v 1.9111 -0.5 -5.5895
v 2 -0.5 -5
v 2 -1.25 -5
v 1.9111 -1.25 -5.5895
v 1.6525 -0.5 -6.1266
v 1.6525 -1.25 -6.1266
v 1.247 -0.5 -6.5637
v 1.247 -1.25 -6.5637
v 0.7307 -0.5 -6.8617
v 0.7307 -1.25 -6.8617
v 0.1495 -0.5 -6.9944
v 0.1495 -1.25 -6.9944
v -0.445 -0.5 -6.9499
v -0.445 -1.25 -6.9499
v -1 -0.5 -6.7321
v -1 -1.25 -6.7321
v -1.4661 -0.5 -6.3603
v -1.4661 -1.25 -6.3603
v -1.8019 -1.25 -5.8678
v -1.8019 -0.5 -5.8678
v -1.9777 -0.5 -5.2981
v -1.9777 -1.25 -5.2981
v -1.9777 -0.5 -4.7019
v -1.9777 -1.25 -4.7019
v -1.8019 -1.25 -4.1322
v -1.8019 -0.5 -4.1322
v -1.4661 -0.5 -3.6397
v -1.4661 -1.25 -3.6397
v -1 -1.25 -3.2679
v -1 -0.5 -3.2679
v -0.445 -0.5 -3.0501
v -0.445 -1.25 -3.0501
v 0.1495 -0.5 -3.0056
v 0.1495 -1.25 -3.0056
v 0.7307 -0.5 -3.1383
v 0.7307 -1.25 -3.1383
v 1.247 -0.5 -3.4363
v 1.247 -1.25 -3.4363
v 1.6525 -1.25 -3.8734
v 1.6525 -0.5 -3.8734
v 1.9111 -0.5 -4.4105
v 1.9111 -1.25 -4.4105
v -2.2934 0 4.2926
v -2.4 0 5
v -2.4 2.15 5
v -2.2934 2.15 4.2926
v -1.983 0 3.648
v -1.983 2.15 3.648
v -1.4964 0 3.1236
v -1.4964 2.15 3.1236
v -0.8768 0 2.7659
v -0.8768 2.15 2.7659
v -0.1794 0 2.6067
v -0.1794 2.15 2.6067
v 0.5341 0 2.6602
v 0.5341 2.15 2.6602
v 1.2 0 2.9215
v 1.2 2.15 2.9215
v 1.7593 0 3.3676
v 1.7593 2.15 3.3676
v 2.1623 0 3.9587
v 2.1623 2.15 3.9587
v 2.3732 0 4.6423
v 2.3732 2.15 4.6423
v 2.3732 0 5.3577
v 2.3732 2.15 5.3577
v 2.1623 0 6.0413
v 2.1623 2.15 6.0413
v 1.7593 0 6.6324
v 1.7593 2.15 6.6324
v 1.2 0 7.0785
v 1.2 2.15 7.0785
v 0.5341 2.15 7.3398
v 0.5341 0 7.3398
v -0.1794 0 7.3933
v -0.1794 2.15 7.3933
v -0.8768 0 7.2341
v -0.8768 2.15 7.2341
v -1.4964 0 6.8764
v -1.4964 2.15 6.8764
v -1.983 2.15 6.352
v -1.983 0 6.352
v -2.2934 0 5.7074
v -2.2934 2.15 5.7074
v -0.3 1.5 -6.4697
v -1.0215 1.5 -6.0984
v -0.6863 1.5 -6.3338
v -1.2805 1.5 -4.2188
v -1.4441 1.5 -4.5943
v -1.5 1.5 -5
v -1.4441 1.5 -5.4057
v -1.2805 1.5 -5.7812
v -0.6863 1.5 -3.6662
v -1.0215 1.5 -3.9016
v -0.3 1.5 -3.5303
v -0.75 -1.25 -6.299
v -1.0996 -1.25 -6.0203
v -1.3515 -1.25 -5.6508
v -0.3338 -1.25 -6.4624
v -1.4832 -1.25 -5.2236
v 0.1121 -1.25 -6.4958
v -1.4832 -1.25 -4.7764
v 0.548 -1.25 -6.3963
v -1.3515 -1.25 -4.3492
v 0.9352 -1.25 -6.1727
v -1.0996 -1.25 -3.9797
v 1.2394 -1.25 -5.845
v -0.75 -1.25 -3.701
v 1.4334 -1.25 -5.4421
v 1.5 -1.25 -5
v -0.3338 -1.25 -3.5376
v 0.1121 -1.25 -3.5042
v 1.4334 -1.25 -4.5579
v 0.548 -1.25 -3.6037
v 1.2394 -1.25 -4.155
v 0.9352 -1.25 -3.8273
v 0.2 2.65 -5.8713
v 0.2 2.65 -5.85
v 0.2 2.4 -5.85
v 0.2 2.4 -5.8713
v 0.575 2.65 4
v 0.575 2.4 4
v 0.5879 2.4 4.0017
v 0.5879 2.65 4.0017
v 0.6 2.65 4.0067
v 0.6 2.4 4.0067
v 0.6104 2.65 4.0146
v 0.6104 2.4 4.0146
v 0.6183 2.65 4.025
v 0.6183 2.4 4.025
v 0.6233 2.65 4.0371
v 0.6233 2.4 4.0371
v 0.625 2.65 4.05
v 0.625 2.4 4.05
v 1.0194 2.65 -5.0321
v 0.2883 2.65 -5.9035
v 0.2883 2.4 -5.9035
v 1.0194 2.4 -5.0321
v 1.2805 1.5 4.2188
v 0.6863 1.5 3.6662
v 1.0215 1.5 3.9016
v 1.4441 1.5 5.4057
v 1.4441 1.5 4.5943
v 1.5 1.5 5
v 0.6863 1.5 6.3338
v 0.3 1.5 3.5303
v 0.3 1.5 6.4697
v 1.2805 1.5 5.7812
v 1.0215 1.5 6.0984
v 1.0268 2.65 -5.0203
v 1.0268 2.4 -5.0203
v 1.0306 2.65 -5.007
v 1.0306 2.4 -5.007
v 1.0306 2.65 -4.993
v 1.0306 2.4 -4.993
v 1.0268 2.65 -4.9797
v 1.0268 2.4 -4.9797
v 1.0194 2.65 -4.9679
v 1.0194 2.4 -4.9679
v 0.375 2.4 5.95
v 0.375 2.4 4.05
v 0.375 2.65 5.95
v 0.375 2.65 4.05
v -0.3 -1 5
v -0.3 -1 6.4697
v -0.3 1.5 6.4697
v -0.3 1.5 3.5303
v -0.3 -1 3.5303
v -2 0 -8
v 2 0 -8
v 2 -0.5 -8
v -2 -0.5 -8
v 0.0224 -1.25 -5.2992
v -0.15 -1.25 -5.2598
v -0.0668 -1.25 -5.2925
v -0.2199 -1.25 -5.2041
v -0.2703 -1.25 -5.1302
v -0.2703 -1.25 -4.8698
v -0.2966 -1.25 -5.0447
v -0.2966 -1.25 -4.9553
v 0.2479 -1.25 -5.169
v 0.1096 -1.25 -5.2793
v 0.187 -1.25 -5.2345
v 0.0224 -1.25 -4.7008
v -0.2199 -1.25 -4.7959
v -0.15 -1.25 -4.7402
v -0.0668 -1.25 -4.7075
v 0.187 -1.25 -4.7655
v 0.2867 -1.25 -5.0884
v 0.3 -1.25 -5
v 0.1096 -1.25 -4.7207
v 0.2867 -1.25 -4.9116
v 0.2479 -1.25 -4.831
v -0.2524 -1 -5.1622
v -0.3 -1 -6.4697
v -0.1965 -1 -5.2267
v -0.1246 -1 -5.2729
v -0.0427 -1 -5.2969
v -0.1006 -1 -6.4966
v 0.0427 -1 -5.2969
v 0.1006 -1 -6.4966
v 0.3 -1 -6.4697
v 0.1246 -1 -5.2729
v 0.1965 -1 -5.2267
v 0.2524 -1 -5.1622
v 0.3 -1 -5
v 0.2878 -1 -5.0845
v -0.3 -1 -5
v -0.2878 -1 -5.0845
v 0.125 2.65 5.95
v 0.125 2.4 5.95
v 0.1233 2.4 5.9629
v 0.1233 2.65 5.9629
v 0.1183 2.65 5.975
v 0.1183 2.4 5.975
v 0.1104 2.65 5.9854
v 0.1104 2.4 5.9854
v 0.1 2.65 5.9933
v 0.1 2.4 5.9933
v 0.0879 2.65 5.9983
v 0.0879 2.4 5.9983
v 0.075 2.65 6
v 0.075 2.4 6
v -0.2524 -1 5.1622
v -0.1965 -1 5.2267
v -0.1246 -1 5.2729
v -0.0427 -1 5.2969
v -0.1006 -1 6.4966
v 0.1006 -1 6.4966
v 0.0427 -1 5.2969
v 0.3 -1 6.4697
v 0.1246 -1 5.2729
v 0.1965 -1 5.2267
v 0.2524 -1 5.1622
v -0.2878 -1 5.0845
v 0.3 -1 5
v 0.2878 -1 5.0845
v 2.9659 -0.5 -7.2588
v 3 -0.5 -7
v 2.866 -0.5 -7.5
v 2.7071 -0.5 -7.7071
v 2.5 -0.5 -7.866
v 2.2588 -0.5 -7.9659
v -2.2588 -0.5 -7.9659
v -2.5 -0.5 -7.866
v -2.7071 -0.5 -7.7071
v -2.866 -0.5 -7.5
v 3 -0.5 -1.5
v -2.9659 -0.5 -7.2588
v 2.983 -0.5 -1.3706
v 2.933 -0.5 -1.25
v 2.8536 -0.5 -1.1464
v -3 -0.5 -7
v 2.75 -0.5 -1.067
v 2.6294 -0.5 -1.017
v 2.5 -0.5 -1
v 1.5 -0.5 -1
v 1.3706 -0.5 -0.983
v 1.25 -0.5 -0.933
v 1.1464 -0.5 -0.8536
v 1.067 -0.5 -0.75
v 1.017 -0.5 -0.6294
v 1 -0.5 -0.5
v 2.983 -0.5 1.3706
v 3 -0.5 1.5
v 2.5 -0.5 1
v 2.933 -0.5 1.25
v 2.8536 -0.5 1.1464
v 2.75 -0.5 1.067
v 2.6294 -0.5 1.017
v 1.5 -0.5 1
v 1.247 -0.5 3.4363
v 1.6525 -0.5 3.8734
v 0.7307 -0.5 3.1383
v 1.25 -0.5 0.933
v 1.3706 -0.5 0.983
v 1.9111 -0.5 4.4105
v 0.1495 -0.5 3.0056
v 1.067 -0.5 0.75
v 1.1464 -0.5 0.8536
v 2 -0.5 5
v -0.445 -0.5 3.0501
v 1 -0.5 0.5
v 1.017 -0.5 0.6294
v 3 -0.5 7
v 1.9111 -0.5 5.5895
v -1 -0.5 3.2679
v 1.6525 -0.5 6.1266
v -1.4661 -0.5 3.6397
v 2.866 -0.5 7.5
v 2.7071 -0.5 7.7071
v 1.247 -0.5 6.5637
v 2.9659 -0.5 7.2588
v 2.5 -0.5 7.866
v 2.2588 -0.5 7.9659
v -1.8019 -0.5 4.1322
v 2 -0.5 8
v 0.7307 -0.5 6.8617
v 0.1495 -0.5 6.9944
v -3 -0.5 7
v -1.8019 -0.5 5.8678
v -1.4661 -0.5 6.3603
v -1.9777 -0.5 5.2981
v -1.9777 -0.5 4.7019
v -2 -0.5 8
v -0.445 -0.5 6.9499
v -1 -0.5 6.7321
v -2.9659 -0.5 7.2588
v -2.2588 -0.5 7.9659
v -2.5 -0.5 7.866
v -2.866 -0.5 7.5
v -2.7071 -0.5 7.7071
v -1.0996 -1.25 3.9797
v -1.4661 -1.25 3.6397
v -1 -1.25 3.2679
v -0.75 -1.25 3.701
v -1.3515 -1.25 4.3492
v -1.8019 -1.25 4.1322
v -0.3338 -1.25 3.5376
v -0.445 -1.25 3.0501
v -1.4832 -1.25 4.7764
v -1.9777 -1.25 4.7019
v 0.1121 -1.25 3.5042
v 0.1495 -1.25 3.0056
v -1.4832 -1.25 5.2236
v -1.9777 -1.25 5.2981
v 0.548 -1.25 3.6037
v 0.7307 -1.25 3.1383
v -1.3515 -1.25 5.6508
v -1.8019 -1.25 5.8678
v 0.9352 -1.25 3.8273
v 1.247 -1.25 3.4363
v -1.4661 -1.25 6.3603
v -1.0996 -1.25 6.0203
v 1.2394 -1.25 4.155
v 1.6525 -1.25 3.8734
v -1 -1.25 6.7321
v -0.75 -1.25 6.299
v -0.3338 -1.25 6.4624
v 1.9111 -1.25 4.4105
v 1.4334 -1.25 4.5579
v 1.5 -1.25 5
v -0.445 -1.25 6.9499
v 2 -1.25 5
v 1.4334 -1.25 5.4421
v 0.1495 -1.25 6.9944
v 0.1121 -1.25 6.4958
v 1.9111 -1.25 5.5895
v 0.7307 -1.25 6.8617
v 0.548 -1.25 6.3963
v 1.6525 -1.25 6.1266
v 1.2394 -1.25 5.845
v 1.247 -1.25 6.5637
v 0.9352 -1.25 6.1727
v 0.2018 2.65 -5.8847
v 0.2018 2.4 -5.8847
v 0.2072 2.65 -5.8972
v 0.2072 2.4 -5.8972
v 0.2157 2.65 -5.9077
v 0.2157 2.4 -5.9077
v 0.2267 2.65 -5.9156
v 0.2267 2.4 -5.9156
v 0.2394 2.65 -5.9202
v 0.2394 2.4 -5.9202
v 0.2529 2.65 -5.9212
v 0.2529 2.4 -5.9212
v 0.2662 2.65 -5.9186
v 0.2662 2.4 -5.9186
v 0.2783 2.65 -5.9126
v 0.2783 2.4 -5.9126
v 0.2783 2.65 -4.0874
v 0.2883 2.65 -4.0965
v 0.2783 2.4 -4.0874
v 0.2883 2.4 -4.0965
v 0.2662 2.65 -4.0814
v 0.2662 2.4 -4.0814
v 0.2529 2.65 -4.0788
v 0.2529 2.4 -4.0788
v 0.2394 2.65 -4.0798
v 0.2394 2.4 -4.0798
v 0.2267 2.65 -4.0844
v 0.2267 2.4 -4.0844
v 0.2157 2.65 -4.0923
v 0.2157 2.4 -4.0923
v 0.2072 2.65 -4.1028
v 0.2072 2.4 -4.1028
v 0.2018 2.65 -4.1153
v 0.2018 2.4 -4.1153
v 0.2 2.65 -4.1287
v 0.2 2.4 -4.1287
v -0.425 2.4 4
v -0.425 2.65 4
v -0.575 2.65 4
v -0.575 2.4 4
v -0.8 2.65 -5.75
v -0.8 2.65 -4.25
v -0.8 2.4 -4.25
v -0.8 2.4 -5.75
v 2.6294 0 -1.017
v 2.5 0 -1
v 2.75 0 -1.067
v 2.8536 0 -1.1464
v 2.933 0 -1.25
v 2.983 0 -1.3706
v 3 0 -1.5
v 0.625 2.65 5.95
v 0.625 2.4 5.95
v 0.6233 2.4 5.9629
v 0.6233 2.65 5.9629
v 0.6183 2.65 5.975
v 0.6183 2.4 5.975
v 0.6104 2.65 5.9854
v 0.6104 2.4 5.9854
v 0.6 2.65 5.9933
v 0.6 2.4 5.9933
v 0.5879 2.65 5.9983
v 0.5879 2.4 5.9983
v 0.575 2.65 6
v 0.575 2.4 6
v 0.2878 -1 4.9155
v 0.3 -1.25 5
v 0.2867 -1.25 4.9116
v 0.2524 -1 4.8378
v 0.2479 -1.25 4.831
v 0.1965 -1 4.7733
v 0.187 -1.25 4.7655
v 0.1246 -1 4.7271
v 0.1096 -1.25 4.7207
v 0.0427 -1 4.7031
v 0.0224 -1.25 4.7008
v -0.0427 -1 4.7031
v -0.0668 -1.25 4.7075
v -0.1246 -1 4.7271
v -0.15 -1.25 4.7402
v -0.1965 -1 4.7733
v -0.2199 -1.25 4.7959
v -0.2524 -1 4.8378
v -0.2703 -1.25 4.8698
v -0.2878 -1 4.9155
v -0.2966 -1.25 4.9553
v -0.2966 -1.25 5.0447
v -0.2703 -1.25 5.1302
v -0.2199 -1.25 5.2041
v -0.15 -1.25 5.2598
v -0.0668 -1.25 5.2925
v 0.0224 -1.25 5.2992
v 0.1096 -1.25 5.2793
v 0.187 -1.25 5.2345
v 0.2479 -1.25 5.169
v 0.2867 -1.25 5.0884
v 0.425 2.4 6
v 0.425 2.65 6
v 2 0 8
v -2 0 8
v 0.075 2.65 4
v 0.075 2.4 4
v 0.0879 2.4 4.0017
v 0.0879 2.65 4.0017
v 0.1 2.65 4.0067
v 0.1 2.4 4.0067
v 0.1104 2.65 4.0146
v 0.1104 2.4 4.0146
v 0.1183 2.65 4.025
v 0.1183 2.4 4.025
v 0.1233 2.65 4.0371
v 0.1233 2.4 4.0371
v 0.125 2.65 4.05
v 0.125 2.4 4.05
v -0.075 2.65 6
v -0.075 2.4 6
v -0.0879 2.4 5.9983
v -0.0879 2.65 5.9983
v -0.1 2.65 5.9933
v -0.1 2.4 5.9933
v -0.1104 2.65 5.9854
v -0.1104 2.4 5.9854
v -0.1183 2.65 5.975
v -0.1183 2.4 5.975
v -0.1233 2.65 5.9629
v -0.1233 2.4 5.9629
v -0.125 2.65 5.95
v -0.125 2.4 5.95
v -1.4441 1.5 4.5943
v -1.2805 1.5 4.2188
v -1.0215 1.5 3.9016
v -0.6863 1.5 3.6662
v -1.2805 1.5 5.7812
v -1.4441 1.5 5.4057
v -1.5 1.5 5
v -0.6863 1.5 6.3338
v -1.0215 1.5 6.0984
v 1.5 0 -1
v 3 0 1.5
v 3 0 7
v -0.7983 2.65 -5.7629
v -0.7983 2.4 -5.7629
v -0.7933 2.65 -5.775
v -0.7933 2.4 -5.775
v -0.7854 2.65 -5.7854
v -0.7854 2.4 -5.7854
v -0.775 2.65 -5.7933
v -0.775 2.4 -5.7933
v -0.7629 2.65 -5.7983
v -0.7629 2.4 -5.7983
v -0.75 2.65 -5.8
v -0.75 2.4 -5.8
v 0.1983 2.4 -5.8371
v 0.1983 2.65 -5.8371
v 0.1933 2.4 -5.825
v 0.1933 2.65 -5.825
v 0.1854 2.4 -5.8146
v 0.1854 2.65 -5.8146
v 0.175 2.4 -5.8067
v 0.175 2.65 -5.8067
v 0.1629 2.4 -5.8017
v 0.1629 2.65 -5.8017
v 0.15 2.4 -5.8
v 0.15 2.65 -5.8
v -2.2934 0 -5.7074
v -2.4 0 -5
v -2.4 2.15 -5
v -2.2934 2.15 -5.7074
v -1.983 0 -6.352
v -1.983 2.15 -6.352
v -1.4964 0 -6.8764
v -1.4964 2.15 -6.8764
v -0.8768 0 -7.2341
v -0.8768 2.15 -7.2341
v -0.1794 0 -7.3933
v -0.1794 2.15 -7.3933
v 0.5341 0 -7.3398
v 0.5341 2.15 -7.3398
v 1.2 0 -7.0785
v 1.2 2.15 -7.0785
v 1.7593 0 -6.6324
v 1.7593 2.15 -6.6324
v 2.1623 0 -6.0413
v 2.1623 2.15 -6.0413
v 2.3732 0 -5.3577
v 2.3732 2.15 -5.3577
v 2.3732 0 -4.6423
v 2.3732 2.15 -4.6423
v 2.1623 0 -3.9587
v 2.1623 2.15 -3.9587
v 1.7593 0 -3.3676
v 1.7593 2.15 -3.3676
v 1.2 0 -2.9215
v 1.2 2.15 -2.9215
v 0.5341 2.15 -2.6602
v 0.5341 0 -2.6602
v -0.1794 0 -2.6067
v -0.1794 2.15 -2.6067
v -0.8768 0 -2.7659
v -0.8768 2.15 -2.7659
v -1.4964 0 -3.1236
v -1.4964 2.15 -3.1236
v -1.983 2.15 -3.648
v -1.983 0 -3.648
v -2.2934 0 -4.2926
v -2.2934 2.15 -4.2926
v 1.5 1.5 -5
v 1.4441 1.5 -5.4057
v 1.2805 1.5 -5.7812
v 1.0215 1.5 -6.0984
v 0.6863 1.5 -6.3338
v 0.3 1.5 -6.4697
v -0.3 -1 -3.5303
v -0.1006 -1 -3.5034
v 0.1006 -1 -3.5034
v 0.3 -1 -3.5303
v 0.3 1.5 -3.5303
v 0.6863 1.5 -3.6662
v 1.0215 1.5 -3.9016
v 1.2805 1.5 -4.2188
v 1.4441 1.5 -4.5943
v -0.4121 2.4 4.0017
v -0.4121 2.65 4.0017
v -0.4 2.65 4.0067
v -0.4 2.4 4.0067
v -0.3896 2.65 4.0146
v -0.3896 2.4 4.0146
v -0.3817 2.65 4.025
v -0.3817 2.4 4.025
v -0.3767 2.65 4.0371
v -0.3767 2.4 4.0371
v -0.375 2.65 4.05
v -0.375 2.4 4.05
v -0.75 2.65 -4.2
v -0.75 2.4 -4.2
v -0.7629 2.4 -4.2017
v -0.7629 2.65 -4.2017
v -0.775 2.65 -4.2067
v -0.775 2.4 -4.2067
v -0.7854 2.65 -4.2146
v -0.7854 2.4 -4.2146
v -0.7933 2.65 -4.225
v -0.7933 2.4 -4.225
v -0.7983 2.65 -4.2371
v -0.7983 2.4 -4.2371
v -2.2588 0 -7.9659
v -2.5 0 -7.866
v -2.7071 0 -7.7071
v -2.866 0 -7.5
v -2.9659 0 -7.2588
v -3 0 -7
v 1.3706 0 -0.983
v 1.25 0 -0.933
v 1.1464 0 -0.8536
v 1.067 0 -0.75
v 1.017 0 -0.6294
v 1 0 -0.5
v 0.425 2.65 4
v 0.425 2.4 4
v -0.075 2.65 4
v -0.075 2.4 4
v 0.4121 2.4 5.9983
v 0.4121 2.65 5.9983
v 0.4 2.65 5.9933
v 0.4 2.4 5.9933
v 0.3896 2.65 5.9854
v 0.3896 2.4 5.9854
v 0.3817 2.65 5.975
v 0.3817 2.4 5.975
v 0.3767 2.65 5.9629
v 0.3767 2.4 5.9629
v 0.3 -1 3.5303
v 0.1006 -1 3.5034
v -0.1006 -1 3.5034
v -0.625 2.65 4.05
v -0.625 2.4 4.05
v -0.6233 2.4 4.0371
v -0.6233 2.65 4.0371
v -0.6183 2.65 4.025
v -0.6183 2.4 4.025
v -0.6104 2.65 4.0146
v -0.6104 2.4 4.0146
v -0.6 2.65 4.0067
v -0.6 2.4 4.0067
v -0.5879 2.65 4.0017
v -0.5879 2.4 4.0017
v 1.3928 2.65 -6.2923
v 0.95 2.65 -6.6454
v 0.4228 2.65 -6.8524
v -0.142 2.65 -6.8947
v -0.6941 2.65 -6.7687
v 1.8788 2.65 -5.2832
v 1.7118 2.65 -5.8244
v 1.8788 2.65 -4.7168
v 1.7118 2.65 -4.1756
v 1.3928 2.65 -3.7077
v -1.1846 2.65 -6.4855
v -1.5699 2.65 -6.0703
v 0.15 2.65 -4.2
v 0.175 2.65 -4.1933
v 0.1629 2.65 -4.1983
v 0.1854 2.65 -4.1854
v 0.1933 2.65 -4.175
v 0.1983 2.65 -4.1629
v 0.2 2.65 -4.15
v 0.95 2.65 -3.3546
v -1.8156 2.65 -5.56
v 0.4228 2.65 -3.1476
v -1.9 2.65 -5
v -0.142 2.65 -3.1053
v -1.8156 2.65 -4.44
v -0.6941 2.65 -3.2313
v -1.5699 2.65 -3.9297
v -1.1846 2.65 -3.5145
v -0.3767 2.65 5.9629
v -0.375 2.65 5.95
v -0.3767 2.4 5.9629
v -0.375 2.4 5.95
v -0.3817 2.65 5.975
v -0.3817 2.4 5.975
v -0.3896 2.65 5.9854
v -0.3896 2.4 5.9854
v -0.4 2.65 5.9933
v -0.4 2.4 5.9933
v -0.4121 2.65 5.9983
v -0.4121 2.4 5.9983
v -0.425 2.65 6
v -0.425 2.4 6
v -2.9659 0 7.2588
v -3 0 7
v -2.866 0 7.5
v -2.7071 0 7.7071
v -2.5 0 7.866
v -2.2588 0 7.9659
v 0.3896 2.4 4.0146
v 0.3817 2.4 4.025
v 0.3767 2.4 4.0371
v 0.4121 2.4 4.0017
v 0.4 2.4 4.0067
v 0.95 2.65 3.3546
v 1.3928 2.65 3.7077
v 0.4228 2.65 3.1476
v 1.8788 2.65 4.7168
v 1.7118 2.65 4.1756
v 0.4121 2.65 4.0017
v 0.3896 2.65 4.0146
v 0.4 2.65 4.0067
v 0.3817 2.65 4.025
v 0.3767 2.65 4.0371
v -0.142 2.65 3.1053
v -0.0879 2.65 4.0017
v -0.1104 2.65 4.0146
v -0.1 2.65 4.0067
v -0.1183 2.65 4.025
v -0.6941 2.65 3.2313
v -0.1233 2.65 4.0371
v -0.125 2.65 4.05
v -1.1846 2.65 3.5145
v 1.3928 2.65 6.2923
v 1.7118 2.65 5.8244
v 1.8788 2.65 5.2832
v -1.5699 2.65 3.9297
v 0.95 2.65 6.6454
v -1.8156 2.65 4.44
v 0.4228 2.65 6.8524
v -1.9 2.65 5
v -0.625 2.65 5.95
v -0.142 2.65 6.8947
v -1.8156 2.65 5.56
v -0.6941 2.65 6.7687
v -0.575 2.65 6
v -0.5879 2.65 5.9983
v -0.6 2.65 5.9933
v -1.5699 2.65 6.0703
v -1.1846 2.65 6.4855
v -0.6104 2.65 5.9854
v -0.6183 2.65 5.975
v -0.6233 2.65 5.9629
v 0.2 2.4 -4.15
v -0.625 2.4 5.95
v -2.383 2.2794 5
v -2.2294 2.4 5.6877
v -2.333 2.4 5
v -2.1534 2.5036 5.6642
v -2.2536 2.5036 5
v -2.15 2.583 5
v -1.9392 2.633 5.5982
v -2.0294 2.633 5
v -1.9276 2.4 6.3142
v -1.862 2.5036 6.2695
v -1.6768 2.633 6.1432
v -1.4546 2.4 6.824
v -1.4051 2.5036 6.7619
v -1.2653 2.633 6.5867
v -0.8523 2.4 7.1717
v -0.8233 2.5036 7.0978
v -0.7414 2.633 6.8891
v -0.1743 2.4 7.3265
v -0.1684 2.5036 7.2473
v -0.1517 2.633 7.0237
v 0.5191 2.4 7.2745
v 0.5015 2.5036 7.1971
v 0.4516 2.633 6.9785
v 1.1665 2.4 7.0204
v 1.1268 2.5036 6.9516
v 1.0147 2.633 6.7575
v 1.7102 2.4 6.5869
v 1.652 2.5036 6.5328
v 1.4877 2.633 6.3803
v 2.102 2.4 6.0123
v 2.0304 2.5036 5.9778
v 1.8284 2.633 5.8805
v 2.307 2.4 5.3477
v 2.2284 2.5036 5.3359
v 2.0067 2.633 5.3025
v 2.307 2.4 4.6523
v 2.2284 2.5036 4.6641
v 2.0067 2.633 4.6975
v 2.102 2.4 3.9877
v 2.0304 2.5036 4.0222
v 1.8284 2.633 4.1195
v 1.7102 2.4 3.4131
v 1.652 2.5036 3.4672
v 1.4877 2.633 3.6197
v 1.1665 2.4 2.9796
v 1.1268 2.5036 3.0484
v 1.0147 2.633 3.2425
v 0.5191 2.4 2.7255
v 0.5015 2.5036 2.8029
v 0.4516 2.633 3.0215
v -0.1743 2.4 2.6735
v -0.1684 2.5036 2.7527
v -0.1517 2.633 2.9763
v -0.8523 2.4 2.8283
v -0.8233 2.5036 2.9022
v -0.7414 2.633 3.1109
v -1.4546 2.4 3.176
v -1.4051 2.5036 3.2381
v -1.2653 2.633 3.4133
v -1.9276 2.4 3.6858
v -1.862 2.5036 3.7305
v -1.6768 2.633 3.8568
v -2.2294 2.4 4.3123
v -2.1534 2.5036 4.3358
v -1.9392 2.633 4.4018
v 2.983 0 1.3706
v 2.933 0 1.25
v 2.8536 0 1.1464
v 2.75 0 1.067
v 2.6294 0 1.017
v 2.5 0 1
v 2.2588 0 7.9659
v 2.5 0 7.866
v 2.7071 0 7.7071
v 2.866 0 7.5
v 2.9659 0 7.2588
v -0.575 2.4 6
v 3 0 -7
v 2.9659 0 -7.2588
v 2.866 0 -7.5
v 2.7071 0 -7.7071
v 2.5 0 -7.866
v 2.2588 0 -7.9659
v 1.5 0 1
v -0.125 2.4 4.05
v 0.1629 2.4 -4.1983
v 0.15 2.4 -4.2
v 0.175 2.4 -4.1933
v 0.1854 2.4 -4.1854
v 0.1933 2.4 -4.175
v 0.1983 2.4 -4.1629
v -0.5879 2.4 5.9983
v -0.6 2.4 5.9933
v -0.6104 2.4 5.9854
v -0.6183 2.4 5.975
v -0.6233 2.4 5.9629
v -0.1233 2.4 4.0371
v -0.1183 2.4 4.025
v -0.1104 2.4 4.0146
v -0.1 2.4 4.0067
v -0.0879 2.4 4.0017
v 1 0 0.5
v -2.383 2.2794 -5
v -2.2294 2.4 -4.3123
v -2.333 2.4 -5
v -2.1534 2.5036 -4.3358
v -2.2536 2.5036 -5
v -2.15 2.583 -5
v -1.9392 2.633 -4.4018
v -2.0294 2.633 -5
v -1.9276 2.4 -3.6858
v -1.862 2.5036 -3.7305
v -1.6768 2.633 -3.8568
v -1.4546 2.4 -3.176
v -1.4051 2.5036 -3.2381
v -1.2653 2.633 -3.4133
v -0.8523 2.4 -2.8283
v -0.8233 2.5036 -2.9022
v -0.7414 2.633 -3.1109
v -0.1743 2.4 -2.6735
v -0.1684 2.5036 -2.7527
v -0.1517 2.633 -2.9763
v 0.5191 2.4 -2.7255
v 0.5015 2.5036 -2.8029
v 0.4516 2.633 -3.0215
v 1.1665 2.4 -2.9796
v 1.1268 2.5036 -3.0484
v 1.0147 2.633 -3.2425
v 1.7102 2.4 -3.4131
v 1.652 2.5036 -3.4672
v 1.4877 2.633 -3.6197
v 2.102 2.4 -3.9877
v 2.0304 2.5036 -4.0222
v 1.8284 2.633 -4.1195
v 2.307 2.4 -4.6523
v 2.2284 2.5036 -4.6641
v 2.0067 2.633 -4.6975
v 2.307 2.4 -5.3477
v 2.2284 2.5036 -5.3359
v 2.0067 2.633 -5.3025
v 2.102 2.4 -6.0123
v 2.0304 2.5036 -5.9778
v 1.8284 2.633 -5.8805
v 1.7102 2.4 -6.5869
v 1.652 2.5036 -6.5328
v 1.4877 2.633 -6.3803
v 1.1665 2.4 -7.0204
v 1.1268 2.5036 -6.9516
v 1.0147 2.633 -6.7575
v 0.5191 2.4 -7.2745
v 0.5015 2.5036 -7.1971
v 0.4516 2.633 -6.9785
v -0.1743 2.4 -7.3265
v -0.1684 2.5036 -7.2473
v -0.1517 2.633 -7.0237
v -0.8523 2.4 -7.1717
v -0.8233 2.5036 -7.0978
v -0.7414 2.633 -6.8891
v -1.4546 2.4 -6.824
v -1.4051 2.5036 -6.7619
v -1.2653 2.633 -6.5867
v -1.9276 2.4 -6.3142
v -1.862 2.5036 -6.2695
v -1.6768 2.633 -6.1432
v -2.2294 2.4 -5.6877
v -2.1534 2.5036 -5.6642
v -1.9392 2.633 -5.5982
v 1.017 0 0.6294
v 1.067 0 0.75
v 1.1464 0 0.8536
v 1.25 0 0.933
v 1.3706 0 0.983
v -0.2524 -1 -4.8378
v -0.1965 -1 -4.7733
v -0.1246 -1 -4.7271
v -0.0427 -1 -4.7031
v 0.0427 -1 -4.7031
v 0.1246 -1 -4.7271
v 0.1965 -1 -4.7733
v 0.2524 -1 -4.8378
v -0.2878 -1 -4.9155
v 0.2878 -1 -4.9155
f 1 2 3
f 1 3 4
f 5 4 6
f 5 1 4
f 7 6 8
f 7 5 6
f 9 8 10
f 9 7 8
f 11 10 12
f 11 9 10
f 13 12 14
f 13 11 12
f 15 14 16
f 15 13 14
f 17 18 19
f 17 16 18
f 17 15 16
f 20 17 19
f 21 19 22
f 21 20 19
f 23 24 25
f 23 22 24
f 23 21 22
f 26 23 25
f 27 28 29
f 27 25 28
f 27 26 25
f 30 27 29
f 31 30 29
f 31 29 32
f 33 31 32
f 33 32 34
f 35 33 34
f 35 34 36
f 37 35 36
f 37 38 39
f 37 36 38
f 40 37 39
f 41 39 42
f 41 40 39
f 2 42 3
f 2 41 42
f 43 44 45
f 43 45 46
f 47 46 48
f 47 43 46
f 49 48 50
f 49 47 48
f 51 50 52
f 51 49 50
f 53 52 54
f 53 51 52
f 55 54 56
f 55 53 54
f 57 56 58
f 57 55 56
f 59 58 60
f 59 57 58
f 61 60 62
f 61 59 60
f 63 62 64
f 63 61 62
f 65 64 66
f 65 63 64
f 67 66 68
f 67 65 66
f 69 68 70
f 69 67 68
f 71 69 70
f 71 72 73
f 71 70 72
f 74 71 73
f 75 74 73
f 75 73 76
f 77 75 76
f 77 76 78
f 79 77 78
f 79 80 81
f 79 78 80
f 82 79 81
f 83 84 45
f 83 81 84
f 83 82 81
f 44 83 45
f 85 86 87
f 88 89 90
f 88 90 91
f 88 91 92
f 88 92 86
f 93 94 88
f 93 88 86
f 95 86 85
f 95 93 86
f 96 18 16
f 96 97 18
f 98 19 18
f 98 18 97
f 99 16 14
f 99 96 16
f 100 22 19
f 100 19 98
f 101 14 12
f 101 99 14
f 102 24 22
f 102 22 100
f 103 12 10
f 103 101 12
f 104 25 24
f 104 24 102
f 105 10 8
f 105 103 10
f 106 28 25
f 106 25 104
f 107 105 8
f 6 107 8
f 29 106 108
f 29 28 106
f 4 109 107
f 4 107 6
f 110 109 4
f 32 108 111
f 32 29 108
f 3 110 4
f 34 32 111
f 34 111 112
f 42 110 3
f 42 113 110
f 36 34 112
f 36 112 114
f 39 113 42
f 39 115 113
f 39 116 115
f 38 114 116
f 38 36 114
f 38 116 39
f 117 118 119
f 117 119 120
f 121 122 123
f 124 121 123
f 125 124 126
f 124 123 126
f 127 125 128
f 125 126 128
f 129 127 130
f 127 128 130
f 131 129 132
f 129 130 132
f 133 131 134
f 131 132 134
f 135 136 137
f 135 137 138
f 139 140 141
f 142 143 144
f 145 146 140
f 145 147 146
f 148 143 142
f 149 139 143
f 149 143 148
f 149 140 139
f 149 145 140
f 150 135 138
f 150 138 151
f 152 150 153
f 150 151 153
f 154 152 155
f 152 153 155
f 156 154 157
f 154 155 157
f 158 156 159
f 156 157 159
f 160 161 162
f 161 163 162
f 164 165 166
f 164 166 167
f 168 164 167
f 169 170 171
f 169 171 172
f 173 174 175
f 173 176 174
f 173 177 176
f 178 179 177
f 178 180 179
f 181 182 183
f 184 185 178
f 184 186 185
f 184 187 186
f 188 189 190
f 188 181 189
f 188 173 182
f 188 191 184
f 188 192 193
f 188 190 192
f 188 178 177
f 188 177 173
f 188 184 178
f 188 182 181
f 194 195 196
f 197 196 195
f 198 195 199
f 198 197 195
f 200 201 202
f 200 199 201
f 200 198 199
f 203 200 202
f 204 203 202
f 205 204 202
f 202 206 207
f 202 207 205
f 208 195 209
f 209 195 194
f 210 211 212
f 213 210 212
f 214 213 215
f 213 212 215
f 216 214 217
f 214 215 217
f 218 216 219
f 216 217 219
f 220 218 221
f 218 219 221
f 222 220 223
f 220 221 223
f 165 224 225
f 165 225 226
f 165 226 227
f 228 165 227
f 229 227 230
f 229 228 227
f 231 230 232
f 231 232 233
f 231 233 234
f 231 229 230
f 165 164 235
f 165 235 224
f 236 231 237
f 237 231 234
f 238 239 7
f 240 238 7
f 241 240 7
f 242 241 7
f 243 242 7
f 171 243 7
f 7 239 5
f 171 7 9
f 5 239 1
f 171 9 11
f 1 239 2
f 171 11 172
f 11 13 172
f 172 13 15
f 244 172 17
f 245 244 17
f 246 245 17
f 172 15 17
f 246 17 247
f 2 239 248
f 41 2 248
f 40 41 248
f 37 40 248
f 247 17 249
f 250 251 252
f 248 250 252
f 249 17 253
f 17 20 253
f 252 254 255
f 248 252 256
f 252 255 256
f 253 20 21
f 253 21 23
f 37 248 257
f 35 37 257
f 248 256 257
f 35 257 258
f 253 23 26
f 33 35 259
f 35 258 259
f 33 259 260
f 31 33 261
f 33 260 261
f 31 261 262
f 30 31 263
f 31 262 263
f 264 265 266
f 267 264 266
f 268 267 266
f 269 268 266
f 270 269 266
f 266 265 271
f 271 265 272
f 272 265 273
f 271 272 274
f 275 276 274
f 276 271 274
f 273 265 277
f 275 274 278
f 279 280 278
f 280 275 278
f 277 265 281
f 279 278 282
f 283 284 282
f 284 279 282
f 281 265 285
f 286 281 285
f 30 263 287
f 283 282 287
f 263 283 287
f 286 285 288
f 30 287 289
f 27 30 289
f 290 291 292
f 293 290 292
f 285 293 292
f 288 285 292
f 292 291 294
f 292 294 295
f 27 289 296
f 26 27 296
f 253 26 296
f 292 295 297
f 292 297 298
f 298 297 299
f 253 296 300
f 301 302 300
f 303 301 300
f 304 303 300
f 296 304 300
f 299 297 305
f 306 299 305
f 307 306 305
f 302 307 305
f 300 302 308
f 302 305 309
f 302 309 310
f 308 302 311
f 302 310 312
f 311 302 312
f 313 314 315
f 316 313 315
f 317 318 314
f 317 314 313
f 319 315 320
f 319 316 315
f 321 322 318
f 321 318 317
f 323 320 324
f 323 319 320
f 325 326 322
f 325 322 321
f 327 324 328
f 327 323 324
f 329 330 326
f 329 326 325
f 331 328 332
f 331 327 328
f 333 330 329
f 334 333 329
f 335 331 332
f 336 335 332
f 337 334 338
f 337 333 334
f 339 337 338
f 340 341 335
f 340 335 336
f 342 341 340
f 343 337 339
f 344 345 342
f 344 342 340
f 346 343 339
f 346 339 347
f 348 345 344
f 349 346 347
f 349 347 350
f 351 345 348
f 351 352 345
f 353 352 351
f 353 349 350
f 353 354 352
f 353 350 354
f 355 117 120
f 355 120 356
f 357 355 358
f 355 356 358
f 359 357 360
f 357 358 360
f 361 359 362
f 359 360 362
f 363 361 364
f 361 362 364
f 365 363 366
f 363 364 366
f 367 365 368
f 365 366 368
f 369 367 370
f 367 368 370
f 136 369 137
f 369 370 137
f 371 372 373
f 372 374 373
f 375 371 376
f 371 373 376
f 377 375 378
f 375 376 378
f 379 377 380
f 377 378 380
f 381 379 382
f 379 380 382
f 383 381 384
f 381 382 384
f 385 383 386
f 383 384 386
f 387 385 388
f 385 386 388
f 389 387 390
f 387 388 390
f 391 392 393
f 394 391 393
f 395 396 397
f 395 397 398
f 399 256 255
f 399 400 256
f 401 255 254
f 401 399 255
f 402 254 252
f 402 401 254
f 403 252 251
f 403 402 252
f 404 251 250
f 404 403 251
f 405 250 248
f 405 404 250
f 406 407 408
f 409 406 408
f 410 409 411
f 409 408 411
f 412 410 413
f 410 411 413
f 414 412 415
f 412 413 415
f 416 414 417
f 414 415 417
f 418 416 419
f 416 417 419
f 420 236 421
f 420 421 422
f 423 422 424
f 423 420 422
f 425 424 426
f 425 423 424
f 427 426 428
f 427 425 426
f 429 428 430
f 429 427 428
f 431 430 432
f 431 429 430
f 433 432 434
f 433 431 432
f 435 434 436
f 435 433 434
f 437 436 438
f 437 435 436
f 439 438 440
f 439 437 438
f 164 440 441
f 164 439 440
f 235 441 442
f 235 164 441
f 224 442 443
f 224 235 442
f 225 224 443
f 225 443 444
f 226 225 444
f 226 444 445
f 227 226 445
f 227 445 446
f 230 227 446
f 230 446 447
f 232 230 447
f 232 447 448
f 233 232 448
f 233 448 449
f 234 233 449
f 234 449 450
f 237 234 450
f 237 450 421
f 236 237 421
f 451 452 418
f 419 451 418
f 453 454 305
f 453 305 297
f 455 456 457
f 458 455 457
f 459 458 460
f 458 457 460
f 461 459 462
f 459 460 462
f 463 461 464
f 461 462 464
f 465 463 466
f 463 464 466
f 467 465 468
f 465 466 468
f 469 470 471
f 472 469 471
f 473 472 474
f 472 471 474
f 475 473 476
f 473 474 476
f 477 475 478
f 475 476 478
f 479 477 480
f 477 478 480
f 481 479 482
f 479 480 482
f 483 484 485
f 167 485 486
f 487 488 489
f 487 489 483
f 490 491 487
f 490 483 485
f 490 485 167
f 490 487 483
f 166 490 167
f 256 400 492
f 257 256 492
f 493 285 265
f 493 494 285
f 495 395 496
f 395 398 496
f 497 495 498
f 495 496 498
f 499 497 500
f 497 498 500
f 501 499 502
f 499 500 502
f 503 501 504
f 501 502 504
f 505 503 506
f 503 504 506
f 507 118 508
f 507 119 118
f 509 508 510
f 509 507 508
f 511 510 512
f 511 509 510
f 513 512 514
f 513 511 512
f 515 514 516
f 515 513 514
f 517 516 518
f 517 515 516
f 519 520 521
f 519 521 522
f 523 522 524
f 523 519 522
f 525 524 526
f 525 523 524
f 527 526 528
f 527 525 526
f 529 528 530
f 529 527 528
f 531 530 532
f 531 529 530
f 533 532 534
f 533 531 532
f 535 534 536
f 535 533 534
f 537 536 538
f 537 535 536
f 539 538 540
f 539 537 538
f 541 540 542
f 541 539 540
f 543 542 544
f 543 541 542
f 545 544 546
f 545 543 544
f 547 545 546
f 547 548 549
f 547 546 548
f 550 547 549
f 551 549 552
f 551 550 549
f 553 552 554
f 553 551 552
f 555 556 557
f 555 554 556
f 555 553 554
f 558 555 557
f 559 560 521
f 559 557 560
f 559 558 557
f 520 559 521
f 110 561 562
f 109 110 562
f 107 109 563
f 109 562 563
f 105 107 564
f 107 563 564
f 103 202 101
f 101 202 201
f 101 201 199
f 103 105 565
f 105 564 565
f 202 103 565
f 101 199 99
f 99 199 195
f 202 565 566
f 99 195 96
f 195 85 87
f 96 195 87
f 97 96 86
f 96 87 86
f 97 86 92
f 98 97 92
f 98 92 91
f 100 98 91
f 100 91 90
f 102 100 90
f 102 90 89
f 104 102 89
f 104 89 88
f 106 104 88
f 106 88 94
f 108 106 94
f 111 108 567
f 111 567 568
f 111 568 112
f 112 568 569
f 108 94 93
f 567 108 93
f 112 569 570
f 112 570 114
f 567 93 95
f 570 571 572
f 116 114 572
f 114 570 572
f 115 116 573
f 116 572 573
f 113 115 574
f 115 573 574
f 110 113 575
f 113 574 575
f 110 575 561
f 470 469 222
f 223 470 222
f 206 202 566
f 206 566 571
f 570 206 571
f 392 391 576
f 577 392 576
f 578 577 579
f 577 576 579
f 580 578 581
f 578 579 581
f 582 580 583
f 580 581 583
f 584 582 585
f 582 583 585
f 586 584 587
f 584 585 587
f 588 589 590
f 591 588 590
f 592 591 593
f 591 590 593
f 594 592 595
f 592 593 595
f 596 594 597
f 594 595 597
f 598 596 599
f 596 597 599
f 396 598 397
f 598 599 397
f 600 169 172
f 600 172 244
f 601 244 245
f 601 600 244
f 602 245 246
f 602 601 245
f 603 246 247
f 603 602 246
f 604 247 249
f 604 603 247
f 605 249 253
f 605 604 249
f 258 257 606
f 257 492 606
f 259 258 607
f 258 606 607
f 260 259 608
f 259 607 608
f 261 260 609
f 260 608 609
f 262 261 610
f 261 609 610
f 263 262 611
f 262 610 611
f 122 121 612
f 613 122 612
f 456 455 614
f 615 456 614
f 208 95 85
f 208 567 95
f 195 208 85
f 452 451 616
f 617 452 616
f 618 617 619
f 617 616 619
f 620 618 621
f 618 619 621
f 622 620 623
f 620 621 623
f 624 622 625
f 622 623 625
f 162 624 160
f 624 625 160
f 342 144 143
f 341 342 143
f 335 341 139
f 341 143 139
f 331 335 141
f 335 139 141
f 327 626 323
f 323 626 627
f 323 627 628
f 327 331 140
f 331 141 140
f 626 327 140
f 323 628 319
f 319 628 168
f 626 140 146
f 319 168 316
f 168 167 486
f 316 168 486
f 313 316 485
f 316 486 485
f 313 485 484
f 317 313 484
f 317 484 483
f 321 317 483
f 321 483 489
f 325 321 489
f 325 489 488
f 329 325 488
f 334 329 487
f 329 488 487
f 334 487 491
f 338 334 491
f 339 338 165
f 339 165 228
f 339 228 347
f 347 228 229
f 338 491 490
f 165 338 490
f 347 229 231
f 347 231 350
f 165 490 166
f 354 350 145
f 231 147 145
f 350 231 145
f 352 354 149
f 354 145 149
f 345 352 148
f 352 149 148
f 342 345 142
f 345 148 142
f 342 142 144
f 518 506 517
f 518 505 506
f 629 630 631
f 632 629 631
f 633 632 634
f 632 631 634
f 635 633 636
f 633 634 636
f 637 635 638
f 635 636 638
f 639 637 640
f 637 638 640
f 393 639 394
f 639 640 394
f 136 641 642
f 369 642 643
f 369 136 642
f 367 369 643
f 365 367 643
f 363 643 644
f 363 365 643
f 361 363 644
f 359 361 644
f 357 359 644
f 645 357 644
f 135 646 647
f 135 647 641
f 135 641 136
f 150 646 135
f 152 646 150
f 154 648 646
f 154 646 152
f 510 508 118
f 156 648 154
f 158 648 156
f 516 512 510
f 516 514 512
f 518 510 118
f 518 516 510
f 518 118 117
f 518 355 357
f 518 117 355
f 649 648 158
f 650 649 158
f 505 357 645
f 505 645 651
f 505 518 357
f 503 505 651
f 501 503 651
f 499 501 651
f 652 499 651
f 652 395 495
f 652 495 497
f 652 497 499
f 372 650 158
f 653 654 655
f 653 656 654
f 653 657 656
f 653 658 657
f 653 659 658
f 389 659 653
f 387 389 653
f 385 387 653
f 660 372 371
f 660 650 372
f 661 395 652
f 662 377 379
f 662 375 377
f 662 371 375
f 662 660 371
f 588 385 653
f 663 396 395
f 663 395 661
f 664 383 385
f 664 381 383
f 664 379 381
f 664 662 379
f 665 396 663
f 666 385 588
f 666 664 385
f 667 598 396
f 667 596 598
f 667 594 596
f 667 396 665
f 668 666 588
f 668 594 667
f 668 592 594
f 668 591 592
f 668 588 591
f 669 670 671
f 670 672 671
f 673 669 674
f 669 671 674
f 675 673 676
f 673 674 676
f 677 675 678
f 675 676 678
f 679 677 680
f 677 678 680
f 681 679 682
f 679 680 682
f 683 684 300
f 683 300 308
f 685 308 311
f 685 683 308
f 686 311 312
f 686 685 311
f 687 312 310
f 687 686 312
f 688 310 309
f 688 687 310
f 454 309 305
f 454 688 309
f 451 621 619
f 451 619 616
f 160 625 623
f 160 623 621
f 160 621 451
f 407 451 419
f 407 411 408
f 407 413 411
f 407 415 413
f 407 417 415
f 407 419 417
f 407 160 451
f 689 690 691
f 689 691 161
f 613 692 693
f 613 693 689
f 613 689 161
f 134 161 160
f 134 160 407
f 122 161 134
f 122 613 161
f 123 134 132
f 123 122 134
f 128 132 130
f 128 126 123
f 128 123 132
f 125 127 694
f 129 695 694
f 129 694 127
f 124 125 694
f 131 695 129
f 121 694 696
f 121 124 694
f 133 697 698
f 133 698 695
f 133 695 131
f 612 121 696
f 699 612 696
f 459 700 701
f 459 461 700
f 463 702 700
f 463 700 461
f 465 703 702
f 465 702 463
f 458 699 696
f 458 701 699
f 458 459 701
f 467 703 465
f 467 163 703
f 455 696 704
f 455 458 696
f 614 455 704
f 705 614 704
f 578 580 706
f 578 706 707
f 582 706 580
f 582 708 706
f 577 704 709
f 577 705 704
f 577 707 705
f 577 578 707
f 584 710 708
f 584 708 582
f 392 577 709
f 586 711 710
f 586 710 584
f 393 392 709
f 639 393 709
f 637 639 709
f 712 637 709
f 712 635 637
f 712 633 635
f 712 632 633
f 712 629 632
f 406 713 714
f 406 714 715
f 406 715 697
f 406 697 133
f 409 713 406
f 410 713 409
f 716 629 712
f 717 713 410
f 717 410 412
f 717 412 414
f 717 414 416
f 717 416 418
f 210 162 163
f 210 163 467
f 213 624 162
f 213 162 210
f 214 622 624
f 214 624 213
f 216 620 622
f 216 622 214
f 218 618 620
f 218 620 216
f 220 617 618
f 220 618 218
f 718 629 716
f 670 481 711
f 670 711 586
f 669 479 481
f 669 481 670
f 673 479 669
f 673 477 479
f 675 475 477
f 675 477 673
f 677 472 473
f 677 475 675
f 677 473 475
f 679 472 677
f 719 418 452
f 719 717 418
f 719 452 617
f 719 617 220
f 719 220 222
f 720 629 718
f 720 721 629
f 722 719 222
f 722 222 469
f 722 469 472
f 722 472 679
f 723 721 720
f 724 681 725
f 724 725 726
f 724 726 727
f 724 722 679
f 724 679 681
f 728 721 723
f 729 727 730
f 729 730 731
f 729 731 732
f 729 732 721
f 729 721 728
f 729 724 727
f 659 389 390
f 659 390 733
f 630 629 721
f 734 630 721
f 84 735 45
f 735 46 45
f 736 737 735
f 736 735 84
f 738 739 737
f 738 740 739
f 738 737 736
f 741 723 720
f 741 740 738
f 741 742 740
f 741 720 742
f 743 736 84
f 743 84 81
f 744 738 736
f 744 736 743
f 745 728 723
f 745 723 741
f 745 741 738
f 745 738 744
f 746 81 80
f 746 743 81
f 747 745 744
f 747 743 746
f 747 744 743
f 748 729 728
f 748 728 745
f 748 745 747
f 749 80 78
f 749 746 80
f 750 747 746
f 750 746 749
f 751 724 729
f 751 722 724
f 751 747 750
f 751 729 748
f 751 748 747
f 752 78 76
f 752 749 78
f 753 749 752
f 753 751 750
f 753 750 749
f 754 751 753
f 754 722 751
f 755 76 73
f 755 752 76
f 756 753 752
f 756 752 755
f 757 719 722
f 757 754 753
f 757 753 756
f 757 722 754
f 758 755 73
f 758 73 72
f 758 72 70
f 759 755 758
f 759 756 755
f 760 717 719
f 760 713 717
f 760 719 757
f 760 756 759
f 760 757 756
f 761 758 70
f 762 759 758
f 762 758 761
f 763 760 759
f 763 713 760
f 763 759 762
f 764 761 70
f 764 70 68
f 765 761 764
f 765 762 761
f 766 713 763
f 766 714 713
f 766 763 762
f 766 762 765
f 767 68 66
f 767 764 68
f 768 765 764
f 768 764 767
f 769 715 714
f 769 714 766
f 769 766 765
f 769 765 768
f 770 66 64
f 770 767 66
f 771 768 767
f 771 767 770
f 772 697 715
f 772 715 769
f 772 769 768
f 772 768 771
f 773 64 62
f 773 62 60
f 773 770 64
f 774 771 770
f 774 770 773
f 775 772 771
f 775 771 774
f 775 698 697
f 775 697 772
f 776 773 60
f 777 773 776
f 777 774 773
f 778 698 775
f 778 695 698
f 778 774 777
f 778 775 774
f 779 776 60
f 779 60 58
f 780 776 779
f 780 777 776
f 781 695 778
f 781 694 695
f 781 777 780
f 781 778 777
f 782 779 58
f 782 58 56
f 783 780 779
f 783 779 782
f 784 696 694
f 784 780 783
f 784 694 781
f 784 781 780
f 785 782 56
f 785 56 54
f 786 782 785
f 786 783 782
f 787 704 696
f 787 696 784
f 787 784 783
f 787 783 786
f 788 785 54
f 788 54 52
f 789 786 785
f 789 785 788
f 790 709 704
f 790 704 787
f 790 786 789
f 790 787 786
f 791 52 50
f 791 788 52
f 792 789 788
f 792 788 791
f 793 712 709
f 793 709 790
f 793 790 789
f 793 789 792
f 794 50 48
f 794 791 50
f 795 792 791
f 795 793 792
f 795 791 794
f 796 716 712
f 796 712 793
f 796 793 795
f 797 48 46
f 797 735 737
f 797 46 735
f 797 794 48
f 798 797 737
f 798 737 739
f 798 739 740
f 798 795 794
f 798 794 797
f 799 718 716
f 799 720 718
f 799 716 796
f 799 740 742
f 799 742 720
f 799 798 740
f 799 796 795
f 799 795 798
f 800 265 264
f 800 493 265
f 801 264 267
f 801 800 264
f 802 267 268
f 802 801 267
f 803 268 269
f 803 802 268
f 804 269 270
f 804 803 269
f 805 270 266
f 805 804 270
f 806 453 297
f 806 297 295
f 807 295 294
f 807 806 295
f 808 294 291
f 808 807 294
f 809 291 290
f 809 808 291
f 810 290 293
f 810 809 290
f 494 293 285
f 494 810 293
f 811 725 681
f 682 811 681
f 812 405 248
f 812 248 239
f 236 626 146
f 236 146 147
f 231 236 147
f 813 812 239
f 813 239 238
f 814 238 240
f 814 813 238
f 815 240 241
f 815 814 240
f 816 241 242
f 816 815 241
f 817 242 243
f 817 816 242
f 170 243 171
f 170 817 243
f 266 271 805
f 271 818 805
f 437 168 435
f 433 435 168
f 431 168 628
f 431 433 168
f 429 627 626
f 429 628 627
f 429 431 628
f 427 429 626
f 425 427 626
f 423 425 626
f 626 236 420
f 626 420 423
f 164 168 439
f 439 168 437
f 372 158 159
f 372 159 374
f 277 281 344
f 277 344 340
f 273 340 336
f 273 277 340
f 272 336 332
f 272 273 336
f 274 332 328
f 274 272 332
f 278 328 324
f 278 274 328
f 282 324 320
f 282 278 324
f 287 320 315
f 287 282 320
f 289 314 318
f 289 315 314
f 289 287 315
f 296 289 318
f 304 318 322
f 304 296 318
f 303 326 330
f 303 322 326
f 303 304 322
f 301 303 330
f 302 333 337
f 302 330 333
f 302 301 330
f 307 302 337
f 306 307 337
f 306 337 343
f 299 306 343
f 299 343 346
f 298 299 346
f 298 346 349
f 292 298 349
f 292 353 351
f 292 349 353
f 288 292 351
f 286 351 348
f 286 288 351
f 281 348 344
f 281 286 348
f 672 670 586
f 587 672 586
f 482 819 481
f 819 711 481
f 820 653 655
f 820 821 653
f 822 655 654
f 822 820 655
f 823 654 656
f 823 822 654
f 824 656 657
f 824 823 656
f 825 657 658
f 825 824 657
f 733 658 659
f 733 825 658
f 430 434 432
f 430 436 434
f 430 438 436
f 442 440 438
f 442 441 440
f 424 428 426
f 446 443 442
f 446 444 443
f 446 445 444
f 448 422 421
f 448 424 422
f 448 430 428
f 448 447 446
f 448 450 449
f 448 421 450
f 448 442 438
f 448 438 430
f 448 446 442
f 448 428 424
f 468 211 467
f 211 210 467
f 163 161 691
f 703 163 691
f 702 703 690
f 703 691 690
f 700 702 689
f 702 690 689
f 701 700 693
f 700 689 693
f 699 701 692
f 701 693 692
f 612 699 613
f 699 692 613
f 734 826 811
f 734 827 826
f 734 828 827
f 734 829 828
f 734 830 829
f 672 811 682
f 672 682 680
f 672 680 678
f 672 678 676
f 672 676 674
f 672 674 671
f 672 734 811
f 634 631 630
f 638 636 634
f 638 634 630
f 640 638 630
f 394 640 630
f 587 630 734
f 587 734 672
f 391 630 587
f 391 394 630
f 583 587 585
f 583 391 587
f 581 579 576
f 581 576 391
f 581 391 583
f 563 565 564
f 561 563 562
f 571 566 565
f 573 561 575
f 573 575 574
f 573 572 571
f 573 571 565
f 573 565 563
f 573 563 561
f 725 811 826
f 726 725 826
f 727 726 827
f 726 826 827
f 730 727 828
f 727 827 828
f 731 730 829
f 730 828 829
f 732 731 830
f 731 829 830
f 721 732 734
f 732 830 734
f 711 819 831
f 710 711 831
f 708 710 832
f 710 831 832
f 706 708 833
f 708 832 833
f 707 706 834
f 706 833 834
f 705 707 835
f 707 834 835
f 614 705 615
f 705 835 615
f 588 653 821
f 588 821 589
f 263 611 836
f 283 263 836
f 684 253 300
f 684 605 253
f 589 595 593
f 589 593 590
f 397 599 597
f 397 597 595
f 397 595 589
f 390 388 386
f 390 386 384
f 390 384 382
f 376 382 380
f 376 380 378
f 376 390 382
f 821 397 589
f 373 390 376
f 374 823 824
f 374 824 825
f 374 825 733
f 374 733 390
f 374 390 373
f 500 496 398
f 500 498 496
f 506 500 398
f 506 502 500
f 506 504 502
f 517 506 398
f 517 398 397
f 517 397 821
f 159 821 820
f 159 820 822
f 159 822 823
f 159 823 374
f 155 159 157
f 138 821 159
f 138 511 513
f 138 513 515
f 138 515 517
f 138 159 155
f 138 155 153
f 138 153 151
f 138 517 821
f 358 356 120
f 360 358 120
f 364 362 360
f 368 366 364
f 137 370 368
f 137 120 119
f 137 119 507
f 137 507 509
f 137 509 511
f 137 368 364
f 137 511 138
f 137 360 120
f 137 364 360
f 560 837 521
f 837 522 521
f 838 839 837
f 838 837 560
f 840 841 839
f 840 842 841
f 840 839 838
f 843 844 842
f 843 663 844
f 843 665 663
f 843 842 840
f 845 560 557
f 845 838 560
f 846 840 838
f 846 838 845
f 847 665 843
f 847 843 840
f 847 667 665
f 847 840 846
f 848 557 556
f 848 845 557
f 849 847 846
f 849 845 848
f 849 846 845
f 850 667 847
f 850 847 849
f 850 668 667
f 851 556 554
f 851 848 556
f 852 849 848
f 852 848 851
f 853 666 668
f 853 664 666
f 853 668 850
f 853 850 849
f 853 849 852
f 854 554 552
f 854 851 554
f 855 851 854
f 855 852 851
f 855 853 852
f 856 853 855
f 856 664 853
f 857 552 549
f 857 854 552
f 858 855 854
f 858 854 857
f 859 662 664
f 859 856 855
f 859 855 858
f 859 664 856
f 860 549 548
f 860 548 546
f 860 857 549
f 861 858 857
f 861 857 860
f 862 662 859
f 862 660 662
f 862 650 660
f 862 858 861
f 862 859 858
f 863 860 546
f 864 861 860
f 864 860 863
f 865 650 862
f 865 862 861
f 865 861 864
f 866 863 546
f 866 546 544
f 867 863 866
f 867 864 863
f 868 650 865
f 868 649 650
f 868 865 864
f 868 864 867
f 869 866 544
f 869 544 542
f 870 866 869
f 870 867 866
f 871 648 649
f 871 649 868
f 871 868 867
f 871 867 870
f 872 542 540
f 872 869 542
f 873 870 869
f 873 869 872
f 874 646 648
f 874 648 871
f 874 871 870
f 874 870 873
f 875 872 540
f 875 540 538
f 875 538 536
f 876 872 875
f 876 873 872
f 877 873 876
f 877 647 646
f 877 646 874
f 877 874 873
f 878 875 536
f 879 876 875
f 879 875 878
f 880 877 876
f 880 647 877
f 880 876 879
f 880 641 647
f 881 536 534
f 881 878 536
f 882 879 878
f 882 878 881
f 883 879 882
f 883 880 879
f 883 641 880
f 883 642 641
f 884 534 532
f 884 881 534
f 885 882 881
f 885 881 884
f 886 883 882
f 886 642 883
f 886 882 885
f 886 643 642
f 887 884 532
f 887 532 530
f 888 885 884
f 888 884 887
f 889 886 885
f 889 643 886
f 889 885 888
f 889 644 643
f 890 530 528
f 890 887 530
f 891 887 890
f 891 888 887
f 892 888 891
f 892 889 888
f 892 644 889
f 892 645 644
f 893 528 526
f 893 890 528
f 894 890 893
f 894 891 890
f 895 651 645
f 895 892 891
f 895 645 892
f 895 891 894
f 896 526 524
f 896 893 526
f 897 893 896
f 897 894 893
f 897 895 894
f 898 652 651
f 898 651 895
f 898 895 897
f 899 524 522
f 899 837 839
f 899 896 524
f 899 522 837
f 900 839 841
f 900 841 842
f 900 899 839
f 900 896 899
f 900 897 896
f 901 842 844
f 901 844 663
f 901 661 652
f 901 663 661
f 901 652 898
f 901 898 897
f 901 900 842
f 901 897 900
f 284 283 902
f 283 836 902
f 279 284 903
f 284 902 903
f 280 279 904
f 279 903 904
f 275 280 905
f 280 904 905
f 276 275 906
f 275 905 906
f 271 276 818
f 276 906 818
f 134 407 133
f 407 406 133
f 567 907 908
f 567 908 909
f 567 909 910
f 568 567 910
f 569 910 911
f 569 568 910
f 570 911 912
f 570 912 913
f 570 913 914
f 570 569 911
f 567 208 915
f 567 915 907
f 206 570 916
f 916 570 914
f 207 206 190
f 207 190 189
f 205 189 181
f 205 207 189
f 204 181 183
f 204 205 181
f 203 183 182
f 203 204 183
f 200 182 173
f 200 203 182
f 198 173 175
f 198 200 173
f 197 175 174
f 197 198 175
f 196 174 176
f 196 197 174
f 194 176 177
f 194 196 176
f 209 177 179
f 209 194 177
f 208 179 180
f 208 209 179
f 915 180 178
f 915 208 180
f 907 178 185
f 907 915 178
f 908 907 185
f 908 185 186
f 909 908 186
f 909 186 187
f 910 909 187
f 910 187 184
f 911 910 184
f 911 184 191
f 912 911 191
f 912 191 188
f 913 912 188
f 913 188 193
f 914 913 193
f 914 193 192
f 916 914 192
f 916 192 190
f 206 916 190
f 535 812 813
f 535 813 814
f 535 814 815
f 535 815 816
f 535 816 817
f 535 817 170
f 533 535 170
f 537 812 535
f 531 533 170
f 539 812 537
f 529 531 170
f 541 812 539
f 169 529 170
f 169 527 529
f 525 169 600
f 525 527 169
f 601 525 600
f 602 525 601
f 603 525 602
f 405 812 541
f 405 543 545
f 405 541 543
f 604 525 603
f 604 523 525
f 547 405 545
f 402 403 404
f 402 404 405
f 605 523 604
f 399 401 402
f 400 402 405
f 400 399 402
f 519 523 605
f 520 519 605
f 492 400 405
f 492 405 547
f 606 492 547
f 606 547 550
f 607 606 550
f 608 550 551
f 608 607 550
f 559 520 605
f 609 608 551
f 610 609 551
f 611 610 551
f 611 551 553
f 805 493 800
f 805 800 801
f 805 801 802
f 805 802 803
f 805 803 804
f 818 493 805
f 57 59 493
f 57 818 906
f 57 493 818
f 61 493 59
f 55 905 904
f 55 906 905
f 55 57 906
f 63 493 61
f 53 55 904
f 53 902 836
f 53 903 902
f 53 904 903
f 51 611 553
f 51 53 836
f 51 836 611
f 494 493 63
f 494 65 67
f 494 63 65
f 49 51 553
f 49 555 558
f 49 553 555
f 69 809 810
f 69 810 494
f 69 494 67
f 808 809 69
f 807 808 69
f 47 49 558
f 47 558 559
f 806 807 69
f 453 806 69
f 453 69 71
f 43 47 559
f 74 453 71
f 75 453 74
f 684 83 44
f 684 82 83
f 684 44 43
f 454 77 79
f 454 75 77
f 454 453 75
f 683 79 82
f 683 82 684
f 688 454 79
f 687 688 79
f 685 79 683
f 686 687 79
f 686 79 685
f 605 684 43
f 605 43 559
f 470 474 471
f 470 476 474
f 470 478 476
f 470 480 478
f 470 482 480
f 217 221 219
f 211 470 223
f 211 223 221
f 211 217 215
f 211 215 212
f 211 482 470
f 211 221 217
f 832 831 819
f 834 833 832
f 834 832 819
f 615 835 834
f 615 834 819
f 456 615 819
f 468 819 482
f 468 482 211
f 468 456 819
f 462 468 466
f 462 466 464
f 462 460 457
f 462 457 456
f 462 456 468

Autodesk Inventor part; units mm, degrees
ref_plane "YZ Plane" through (0, 0, 0) normal (1, 0, 0) x (0, 1, 0)
ref_plane "XZ Plane" through (0, 0, 0) normal (0, 1, 0) x (-1, 0, 0)
ref_plane "XY Plane" through (0, 0, 0) normal (0, 0, 1) x (1, 0, 0)
sketch "Sketch1" plane through (0, 0, 0) normal (0, 1, 0) x (-1, 0, 0)
  line L0 (2, 8) -> (-2, 8)
  line L1 (-3, 7) -> (-3, 3)
  line L2 (-2, -8) -> (2, -8)
  line L3 (3, -7) -> (3, 7)
  circle A0 centre (0, 5) radius 2.4
  circle A1 centre (0, -5) radius 2.4
  arc A2 (3, 7) -> (2, 8) centre (2, 7) ccw
  arc A3 (-2, 8) -> (-3, 7) centre (-2, 7) ccw
  arc A4 (-3, -7) -> (-2, -8) centre (-2, -7) ccw
  arc A5 (2, -8) -> (3, -7) centre (2, -7) ccw
  line L4 (2, 2) -> (2, 2)
  line L5 (2, -2) -> (2, -2)
  line L6 (-2, 2) -> (-2, 2)
  line L7 (-2, -2) -> (-2, -2)
  line L8 (3, 3) -> (3, 7)
  line L9 (-3, 7) -> (-3, 1.5)
  line L10 (-2.5, -1) -> (-1.5, -1)
  line L11 (-1, -0.5) -> (-1, 0.5)
  line L12 (-1.5, 1) -> (-2.5, 1)
  line L13 (-3, -1.5) -> (-3, -7)
  arc A6 (-2.5, -1) -> (-3, -1.5) centre (-2.5, -1.5) ccw
  arc A7 (-3, 1.5) -> (-2.5, 1) centre (-2.5, 1.5) ccw
  arc A8 (-1.5, -1) -> (-1, -0.5) centre (-1.5, -0.5) ccw
  arc A9 (-1, 0.5) -> (-1.5, 1) centre (-1.5, 0.5) ccw
  point P0 (0, 0)
  point P1 (-3, -8)
  point P2 (-3, 8)
  point P3 (3, -8)
  point P4 (1, -2)
  point P5 (1, 2)
  point P6 (3, -2)
  point P7 (-3, 2)
  point P8 (-1, -2)
  point P9 (-3, -2)
  point P10 (-3, -1)
  point P11 (-1, 1)
  point P12 (-1, -1)
  point P13 (-3, 1)
  dimension "d0" = 6
  dimension "d1" = 16
  dimension "d2" = 4.8
  dimension "d3" = 4.8
  dimension "d5" = 3
  dimension "d6" = 1
  dimension "d7" = 2
  dimension "d8" = 4
  dimension "d9" = 2
  dimension "d70" = 2
  dimension "d71" = 2
  dimension "d72" = 0.5
extrude "Extrusion1" add sketch "Sketch1" against normal blind 0.5 contours A2 L3 A5 L2 A4 L13 A6 L10 A8 L11 A9 L12 A7 L9 L1 A3 L0 | A0 | A1
extrude "Extrusion2" add sketch "Sketch1" along normal blind 2.65 contours A0 | A1
fillet "Fillet1" radius 0.5 2 edges at (2.4, 2.65, 5) (2.4, 2.65, -5)
sketch "Sketch2" plane through (0, -0.5, 0) normal (0, -1, 0) x (1, 0, 0)
  circle A0 centre (0, 5) radius 1.5
  circle A1 centre (0, -5) radius 1.5
  circle A2 centre (0, 5) radius 2
  circle A3 centre (0, -5) radius 2
  point P0 (0, 0)
  dimension "d18" = 3
  dimension "d19" = 3
  dimension "d22" = 4
  dimension "d23" = 4
extrude "Extrusion3" cut sketch "Sketch2" against normal blind 2 contours A0 | A1
extrude "Extrusion4" add sketch "Sketch2" along normal blind 0.75
sketch "Sketch4" plane through (0, -0.5, 0) normal (0, -1, 0) x (1, 0, 0)
  line L0 (0.3, 6.75) -> (-0.3, 6.75)
  line L1 (-0.3, 6.75) -> (-0.3, 3.25)
  line L2 (-0.3, 3.25) -> (0.3, 3.25)
  line L3 (0.3, 3.25) -> (0.3, 6.75)
  line L4 (0.3, -3.25) -> (-0.3, -3.25)
  line L5 (-0.3, -3.25) -> (-0.3, -6.75)
  line L6 (-0.3, -6.75) -> (0.3, -6.75)
  line L7 (0.3, -6.75) -> (0.3, -3.25)
  circle A0 centre (0, 5) radius 1.5 projected
  circle A1 centre (0, -5) radius 1.5 projected
  circle A2 centre (0, 5) radius 0.3
  circle A3 centre (0, -5) radius 0.3
  point P0 (0, 0)
  dimension "d26" = 0.6
  dimension "d27" = 3.5
  dimension "d28" = 0.6
  dimension "d29" = 3.5
  dimension "d32" = 1.2
  dimension "d33" = 1.2
  dimension "d34" = 0.6
  dimension "d35" = 0.6
extrude "Extrusion5" add sketch "Sketch4" against normal blind 2 and the other way blind 0.5 contours L3 A0 L1 L0 | L3 A2 L1 A0 | A2 | L3 A0 L1 A2 | A0 L3 L2 L1 | L7 A1 L5 L4 | L7 A3 L5 A1 | A3 | L7 A1 L5 A3 | A1 L7 L6 L5
extrude "Extrusion6" add sketch "Sketch4" along normal blind 0.75 contours A2 | A3
sketch "Sketch6" plane through (0, 2.65, 5) normal (0, 1, 0) x (1, 0, 0)
  line L0 (0.625, 1) -> (0.375, 1)
  line L1 (0.375, 1) -> (0.375, -1)
  line L2 (0.375, -1) -> (0.625, -1)
  line L3 (0.625, -1) -> (0.625, 1)
  line L4 (0.125, -1) -> (0.125, 1)
  line L5 (0.125, 1) -> (-0.125, 1)
  line L6 (-0.125, 1) -> (-0.125, -1)
  line L7 (-0.125, -1) -> (0.125, -1)
  line L8 (-0.375, -1) -> (-0.375, 1)
  line L9 (-0.375, 1) -> (-0.625, 1)
  line L10 (-0.625, 1) -> (-0.625, -1)
  line L11 (-0.625, -1) -> (-0.375, -1)
  point P0 (0, 5)
  point P1 (0, 0)
  dimension "d47" = 0.25
  dimension "d48" = 2
  dimension "d50" = 1
  dimension "d54" = 0.5
  dimension "d59" = 0.625
sketch "Sketch5" plane through (0, 2.65, -5) normal (0, 1, 0) x (1, 0, 0)
  line L0 (-0.8, 0.8) -> (0.2, 0.8)
  line L1 (0.2, -0.8) -> (-0.8, -0.8)
  line L2 (-0.8, -0.8) -> (-0.8, 0.8)
  line L3 (0.2, 0.8) -> (0.2, 1.0087)
  line L4 (0.2, 1.0087) -> (1.0464, 0)
  line L5 (1.0464, 0) -> (0.2, -1.0087)
  line L6 (0.2, -1.0087) -> (0.2, -0.8)
  point P0 (0, -5)
  point P1 (0, 0)
  point P2 (0, 0)
  dimension "d40" = 40
  dimension "d41" = 100
  dimension "d43" = 1.6
  dimension "d44" = 1
  dimension "d62" = 0.8
  dimension "d69" = 0.8
extrude "Extrusion7" cut sketch "Sketch5" against normal blind 0.25
extrude "Extrusion8" cut sketch "Sketch6" against normal blind 0.25
fillet "Fillet6" radius 0.05 7 edges at (-0.8, 2.525, -5.8) (0.2, 2.525, -5.8) (0.2, 2.525, -6.0087) (1.0464, 2.525, -5) (0.2, 2.525, -3.9913) (0.2, 2.525, -4.2) (-0.8, 2.525, -4.2)
fillet "Fillet9" radius 0.05 12 edges at (0.625, 2.525, 6) (0.125, 2.525, 6) (-0.375, 2.525, 6) (0.625, 2.525, 4) (0.125, 2.525, 4) (-0.375, 2.525, 4) (0.375, 2.525, 4) (-0.125, 2.525, 4) (-0.625, 2.525, 4) (0.375, 2.525, 6) (-0.125, 2.525, 6) (-0.625, 2.525, 6)
properties part number "system-buttons"
